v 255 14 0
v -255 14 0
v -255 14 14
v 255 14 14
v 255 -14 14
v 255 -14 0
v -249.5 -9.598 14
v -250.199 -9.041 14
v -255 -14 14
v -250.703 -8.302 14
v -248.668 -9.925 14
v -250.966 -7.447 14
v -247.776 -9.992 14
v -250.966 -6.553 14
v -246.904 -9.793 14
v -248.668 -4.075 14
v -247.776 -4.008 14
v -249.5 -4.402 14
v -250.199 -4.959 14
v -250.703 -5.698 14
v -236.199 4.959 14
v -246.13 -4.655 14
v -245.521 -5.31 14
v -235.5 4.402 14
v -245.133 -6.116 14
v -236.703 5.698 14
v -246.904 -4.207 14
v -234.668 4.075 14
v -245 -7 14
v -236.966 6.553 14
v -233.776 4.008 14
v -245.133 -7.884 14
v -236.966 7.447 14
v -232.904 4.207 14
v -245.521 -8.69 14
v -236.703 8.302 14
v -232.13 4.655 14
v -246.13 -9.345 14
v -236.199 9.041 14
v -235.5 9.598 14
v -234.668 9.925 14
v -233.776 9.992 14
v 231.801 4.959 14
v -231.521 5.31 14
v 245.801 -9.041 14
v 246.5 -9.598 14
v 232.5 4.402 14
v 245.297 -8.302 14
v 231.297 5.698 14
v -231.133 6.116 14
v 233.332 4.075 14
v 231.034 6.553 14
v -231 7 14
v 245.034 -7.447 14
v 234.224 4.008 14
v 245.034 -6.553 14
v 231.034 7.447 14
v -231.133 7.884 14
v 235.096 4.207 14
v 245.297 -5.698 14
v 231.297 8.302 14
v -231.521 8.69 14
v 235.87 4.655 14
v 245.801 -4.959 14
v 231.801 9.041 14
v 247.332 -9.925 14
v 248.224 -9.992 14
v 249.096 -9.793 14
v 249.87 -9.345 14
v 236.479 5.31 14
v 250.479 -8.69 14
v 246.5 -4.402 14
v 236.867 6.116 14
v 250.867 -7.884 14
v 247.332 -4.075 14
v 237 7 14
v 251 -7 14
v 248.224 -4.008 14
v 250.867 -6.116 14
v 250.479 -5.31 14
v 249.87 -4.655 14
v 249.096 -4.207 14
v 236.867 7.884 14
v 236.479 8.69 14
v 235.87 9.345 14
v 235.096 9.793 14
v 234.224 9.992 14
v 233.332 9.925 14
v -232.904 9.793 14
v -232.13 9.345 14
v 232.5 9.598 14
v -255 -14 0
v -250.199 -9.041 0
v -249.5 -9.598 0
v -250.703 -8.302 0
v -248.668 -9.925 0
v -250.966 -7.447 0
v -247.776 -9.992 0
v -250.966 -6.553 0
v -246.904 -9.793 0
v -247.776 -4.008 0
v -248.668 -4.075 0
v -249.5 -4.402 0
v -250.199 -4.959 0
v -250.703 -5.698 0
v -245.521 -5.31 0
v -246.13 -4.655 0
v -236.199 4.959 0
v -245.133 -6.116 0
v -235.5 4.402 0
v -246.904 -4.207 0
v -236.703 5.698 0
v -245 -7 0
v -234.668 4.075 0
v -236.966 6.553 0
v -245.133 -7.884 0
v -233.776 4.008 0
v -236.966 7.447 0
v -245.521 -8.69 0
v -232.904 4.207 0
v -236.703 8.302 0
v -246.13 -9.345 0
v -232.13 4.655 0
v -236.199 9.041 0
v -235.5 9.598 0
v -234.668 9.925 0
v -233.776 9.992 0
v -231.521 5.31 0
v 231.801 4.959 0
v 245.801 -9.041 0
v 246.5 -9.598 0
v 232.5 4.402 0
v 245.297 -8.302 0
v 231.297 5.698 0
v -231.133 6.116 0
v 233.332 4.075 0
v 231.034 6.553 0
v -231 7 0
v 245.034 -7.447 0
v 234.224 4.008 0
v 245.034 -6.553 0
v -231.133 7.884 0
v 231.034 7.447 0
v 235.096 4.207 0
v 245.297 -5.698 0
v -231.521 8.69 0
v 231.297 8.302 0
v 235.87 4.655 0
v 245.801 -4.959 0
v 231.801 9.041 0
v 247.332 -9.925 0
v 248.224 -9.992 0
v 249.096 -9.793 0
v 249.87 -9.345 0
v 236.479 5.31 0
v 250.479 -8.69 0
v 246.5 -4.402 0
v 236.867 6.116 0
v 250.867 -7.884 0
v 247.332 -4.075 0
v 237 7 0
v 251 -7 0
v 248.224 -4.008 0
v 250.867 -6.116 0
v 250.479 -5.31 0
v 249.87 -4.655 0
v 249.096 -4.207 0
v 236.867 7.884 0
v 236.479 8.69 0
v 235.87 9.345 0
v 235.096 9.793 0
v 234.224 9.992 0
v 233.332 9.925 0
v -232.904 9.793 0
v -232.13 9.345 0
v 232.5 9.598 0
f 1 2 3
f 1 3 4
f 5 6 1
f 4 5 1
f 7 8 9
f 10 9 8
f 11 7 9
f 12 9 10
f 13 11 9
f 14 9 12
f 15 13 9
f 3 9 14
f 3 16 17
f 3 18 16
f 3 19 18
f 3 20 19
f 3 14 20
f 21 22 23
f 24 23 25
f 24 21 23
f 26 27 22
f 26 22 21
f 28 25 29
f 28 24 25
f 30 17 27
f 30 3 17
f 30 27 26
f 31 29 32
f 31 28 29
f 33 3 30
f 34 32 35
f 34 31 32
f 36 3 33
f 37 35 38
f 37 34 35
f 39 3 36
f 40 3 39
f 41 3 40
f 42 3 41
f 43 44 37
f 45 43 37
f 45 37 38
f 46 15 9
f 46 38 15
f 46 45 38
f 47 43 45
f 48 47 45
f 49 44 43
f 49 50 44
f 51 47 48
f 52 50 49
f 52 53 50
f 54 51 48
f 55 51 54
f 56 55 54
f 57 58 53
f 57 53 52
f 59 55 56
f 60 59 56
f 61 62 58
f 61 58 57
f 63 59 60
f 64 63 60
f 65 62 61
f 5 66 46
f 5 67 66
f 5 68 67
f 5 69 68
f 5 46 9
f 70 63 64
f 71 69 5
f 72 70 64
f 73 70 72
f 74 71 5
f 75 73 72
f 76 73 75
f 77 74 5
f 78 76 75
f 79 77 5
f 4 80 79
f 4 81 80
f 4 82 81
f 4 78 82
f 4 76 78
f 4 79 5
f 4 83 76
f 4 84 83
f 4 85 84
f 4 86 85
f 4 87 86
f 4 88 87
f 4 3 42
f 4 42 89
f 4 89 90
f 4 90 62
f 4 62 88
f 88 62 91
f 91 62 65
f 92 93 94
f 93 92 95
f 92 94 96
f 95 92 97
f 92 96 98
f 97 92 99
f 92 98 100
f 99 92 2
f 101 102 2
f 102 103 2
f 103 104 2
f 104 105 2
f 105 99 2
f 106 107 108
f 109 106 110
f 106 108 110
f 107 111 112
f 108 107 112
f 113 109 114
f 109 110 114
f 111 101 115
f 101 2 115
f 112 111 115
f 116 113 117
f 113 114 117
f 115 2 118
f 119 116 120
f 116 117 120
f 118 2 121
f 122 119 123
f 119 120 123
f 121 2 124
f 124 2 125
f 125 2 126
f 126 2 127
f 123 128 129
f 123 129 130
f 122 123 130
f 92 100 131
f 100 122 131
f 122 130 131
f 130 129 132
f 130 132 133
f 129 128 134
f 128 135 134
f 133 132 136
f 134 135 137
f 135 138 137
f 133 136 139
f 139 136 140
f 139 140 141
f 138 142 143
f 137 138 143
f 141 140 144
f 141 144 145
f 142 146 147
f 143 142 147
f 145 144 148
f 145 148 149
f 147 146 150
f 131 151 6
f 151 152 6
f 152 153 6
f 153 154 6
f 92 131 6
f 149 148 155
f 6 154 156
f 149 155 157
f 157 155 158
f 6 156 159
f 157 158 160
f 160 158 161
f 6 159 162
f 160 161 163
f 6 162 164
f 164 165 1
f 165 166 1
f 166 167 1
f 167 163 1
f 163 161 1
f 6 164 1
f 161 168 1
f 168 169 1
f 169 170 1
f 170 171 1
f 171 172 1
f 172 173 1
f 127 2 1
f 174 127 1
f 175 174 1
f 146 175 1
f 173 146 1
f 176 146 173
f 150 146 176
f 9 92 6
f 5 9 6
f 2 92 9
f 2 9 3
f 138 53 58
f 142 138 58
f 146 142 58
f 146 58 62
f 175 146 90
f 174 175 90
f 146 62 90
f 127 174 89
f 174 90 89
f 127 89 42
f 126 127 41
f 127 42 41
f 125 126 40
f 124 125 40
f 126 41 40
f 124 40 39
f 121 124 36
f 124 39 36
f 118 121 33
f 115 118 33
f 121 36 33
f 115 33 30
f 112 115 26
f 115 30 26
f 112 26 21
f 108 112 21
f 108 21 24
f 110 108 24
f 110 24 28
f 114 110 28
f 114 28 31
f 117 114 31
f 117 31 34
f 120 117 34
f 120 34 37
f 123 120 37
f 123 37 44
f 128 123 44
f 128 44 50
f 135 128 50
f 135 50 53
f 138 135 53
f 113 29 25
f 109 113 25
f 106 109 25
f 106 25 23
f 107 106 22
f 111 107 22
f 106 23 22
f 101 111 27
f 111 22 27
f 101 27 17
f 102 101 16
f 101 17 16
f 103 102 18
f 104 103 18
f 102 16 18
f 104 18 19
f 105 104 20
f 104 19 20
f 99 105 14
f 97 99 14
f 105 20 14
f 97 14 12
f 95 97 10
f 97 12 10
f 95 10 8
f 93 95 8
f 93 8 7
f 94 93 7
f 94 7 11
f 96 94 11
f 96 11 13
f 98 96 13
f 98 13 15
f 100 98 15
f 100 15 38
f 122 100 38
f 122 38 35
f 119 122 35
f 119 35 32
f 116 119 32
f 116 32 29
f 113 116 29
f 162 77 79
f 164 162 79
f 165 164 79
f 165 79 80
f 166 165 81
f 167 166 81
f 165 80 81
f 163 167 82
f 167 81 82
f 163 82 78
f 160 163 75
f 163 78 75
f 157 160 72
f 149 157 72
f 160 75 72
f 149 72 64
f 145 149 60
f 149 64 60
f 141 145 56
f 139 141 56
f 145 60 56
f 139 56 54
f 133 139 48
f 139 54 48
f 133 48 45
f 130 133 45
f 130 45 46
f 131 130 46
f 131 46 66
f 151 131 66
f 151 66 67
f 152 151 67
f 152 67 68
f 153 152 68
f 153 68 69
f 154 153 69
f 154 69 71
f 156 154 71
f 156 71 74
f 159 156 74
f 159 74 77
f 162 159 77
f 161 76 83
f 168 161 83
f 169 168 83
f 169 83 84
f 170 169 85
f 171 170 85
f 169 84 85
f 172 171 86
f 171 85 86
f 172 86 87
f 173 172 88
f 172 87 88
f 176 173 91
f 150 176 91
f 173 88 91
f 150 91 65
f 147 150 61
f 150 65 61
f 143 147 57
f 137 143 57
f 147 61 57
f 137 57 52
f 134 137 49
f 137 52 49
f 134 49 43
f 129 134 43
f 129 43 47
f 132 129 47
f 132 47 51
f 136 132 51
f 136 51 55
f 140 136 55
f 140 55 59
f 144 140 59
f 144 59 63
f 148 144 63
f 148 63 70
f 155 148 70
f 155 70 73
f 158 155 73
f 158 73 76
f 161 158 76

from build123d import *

# Parameters (mm, degrees)
IZIM1_W                     = 510
IZIM1_H                     = 28
Y_KSEKLIK_EKSTR_ZYON1_DEPTH = 14
KES_EKSTR_ZYON1_REACH       = 257.767
IZIM2_R                     = 3


with BuildPart() as part:
    # Çizim1 → Yükseklik-Ekstrüzyon1 (new body)
    with BuildSketch(Plane.XY):
        Rectangle(IZIM1_W, IZIM1_H)
    extrude(amount=Y_KSEKLIK_EKSTR_ZYON1_DEPTH)

    # Çizim2 → Kes-Ekstrüzyon1 (cut, up to next)
    with BuildSketch(Plane.XY.offset(14), mode=Mode.PRIVATE) as kes_ekstr_zyon1_sk1:
        with Locations((-234, 7)):
            Circle(IZIM2_R)
    kes_ekstr_zyon1_tool1 = extrude(kes_ekstr_zyon1_sk1.sketch, amount=-KES_EKSTR_ZYON1_REACH, mode=Mode.PRIVATE) & part.part
    # Çizim2 → Kes-Ekstrüzyon1 (cut, up to next)
    with BuildSketch(Plane.XY.offset(14), mode=Mode.PRIVATE) as kes_ekstr_zyon1_sk2:
        with Locations((-248, -7)):
            Circle(IZIM2_R)
    kes_ekstr_zyon1_tool2 = extrude(kes_ekstr_zyon1_sk2.sketch, amount=-KES_EKSTR_ZYON1_REACH, mode=Mode.PRIVATE) & part.part
    # Çizim2 → Kes-Ekstrüzyon1 (cut, up to next)
    with BuildSketch(Plane.XY.offset(14), mode=Mode.PRIVATE) as kes_ekstr_zyon1_sk3:
        with Locations((248, -7)):
            Circle(IZIM2_R)
    kes_ekstr_zyon1_tool3 = extrude(kes_ekstr_zyon1_sk3.sketch, amount=-KES_EKSTR_ZYON1_REACH, mode=Mode.PRIVATE) & part.part
    # Çizim2 → Kes-Ekstrüzyon1 (cut, up to next)
    with BuildSketch(Plane.XY.offset(14), mode=Mode.PRIVATE) as kes_ekstr_zyon1_sk4:
        with Locations((234, 7)):
            Circle(IZIM2_R)
    kes_ekstr_zyon1_tool4 = extrude(kes_ekstr_zyon1_sk4.sketch, amount=-KES_EKSTR_ZYON1_REACH, mode=Mode.PRIVATE) & part.part
    add(kes_ekstr_zyon1_tool1.solids().sort_by_distance((-234, 7, 14))[0], mode=Mode.SUBTRACT)
    add(kes_ekstr_zyon1_tool2.solids().sort_by_distance((-248, -7, 14))[0], mode=Mode.SUBTRACT)
    add(kes_ekstr_zyon1_tool3.solids().sort_by_distance((248, -7, 14))[0], mode=Mode.SUBTRACT)
    add(kes_ekstr_zyon1_tool4.solids().sort_by_distance((234, 7, 14))[0], mode=Mode.SUBTRACT)


solid = part.part
